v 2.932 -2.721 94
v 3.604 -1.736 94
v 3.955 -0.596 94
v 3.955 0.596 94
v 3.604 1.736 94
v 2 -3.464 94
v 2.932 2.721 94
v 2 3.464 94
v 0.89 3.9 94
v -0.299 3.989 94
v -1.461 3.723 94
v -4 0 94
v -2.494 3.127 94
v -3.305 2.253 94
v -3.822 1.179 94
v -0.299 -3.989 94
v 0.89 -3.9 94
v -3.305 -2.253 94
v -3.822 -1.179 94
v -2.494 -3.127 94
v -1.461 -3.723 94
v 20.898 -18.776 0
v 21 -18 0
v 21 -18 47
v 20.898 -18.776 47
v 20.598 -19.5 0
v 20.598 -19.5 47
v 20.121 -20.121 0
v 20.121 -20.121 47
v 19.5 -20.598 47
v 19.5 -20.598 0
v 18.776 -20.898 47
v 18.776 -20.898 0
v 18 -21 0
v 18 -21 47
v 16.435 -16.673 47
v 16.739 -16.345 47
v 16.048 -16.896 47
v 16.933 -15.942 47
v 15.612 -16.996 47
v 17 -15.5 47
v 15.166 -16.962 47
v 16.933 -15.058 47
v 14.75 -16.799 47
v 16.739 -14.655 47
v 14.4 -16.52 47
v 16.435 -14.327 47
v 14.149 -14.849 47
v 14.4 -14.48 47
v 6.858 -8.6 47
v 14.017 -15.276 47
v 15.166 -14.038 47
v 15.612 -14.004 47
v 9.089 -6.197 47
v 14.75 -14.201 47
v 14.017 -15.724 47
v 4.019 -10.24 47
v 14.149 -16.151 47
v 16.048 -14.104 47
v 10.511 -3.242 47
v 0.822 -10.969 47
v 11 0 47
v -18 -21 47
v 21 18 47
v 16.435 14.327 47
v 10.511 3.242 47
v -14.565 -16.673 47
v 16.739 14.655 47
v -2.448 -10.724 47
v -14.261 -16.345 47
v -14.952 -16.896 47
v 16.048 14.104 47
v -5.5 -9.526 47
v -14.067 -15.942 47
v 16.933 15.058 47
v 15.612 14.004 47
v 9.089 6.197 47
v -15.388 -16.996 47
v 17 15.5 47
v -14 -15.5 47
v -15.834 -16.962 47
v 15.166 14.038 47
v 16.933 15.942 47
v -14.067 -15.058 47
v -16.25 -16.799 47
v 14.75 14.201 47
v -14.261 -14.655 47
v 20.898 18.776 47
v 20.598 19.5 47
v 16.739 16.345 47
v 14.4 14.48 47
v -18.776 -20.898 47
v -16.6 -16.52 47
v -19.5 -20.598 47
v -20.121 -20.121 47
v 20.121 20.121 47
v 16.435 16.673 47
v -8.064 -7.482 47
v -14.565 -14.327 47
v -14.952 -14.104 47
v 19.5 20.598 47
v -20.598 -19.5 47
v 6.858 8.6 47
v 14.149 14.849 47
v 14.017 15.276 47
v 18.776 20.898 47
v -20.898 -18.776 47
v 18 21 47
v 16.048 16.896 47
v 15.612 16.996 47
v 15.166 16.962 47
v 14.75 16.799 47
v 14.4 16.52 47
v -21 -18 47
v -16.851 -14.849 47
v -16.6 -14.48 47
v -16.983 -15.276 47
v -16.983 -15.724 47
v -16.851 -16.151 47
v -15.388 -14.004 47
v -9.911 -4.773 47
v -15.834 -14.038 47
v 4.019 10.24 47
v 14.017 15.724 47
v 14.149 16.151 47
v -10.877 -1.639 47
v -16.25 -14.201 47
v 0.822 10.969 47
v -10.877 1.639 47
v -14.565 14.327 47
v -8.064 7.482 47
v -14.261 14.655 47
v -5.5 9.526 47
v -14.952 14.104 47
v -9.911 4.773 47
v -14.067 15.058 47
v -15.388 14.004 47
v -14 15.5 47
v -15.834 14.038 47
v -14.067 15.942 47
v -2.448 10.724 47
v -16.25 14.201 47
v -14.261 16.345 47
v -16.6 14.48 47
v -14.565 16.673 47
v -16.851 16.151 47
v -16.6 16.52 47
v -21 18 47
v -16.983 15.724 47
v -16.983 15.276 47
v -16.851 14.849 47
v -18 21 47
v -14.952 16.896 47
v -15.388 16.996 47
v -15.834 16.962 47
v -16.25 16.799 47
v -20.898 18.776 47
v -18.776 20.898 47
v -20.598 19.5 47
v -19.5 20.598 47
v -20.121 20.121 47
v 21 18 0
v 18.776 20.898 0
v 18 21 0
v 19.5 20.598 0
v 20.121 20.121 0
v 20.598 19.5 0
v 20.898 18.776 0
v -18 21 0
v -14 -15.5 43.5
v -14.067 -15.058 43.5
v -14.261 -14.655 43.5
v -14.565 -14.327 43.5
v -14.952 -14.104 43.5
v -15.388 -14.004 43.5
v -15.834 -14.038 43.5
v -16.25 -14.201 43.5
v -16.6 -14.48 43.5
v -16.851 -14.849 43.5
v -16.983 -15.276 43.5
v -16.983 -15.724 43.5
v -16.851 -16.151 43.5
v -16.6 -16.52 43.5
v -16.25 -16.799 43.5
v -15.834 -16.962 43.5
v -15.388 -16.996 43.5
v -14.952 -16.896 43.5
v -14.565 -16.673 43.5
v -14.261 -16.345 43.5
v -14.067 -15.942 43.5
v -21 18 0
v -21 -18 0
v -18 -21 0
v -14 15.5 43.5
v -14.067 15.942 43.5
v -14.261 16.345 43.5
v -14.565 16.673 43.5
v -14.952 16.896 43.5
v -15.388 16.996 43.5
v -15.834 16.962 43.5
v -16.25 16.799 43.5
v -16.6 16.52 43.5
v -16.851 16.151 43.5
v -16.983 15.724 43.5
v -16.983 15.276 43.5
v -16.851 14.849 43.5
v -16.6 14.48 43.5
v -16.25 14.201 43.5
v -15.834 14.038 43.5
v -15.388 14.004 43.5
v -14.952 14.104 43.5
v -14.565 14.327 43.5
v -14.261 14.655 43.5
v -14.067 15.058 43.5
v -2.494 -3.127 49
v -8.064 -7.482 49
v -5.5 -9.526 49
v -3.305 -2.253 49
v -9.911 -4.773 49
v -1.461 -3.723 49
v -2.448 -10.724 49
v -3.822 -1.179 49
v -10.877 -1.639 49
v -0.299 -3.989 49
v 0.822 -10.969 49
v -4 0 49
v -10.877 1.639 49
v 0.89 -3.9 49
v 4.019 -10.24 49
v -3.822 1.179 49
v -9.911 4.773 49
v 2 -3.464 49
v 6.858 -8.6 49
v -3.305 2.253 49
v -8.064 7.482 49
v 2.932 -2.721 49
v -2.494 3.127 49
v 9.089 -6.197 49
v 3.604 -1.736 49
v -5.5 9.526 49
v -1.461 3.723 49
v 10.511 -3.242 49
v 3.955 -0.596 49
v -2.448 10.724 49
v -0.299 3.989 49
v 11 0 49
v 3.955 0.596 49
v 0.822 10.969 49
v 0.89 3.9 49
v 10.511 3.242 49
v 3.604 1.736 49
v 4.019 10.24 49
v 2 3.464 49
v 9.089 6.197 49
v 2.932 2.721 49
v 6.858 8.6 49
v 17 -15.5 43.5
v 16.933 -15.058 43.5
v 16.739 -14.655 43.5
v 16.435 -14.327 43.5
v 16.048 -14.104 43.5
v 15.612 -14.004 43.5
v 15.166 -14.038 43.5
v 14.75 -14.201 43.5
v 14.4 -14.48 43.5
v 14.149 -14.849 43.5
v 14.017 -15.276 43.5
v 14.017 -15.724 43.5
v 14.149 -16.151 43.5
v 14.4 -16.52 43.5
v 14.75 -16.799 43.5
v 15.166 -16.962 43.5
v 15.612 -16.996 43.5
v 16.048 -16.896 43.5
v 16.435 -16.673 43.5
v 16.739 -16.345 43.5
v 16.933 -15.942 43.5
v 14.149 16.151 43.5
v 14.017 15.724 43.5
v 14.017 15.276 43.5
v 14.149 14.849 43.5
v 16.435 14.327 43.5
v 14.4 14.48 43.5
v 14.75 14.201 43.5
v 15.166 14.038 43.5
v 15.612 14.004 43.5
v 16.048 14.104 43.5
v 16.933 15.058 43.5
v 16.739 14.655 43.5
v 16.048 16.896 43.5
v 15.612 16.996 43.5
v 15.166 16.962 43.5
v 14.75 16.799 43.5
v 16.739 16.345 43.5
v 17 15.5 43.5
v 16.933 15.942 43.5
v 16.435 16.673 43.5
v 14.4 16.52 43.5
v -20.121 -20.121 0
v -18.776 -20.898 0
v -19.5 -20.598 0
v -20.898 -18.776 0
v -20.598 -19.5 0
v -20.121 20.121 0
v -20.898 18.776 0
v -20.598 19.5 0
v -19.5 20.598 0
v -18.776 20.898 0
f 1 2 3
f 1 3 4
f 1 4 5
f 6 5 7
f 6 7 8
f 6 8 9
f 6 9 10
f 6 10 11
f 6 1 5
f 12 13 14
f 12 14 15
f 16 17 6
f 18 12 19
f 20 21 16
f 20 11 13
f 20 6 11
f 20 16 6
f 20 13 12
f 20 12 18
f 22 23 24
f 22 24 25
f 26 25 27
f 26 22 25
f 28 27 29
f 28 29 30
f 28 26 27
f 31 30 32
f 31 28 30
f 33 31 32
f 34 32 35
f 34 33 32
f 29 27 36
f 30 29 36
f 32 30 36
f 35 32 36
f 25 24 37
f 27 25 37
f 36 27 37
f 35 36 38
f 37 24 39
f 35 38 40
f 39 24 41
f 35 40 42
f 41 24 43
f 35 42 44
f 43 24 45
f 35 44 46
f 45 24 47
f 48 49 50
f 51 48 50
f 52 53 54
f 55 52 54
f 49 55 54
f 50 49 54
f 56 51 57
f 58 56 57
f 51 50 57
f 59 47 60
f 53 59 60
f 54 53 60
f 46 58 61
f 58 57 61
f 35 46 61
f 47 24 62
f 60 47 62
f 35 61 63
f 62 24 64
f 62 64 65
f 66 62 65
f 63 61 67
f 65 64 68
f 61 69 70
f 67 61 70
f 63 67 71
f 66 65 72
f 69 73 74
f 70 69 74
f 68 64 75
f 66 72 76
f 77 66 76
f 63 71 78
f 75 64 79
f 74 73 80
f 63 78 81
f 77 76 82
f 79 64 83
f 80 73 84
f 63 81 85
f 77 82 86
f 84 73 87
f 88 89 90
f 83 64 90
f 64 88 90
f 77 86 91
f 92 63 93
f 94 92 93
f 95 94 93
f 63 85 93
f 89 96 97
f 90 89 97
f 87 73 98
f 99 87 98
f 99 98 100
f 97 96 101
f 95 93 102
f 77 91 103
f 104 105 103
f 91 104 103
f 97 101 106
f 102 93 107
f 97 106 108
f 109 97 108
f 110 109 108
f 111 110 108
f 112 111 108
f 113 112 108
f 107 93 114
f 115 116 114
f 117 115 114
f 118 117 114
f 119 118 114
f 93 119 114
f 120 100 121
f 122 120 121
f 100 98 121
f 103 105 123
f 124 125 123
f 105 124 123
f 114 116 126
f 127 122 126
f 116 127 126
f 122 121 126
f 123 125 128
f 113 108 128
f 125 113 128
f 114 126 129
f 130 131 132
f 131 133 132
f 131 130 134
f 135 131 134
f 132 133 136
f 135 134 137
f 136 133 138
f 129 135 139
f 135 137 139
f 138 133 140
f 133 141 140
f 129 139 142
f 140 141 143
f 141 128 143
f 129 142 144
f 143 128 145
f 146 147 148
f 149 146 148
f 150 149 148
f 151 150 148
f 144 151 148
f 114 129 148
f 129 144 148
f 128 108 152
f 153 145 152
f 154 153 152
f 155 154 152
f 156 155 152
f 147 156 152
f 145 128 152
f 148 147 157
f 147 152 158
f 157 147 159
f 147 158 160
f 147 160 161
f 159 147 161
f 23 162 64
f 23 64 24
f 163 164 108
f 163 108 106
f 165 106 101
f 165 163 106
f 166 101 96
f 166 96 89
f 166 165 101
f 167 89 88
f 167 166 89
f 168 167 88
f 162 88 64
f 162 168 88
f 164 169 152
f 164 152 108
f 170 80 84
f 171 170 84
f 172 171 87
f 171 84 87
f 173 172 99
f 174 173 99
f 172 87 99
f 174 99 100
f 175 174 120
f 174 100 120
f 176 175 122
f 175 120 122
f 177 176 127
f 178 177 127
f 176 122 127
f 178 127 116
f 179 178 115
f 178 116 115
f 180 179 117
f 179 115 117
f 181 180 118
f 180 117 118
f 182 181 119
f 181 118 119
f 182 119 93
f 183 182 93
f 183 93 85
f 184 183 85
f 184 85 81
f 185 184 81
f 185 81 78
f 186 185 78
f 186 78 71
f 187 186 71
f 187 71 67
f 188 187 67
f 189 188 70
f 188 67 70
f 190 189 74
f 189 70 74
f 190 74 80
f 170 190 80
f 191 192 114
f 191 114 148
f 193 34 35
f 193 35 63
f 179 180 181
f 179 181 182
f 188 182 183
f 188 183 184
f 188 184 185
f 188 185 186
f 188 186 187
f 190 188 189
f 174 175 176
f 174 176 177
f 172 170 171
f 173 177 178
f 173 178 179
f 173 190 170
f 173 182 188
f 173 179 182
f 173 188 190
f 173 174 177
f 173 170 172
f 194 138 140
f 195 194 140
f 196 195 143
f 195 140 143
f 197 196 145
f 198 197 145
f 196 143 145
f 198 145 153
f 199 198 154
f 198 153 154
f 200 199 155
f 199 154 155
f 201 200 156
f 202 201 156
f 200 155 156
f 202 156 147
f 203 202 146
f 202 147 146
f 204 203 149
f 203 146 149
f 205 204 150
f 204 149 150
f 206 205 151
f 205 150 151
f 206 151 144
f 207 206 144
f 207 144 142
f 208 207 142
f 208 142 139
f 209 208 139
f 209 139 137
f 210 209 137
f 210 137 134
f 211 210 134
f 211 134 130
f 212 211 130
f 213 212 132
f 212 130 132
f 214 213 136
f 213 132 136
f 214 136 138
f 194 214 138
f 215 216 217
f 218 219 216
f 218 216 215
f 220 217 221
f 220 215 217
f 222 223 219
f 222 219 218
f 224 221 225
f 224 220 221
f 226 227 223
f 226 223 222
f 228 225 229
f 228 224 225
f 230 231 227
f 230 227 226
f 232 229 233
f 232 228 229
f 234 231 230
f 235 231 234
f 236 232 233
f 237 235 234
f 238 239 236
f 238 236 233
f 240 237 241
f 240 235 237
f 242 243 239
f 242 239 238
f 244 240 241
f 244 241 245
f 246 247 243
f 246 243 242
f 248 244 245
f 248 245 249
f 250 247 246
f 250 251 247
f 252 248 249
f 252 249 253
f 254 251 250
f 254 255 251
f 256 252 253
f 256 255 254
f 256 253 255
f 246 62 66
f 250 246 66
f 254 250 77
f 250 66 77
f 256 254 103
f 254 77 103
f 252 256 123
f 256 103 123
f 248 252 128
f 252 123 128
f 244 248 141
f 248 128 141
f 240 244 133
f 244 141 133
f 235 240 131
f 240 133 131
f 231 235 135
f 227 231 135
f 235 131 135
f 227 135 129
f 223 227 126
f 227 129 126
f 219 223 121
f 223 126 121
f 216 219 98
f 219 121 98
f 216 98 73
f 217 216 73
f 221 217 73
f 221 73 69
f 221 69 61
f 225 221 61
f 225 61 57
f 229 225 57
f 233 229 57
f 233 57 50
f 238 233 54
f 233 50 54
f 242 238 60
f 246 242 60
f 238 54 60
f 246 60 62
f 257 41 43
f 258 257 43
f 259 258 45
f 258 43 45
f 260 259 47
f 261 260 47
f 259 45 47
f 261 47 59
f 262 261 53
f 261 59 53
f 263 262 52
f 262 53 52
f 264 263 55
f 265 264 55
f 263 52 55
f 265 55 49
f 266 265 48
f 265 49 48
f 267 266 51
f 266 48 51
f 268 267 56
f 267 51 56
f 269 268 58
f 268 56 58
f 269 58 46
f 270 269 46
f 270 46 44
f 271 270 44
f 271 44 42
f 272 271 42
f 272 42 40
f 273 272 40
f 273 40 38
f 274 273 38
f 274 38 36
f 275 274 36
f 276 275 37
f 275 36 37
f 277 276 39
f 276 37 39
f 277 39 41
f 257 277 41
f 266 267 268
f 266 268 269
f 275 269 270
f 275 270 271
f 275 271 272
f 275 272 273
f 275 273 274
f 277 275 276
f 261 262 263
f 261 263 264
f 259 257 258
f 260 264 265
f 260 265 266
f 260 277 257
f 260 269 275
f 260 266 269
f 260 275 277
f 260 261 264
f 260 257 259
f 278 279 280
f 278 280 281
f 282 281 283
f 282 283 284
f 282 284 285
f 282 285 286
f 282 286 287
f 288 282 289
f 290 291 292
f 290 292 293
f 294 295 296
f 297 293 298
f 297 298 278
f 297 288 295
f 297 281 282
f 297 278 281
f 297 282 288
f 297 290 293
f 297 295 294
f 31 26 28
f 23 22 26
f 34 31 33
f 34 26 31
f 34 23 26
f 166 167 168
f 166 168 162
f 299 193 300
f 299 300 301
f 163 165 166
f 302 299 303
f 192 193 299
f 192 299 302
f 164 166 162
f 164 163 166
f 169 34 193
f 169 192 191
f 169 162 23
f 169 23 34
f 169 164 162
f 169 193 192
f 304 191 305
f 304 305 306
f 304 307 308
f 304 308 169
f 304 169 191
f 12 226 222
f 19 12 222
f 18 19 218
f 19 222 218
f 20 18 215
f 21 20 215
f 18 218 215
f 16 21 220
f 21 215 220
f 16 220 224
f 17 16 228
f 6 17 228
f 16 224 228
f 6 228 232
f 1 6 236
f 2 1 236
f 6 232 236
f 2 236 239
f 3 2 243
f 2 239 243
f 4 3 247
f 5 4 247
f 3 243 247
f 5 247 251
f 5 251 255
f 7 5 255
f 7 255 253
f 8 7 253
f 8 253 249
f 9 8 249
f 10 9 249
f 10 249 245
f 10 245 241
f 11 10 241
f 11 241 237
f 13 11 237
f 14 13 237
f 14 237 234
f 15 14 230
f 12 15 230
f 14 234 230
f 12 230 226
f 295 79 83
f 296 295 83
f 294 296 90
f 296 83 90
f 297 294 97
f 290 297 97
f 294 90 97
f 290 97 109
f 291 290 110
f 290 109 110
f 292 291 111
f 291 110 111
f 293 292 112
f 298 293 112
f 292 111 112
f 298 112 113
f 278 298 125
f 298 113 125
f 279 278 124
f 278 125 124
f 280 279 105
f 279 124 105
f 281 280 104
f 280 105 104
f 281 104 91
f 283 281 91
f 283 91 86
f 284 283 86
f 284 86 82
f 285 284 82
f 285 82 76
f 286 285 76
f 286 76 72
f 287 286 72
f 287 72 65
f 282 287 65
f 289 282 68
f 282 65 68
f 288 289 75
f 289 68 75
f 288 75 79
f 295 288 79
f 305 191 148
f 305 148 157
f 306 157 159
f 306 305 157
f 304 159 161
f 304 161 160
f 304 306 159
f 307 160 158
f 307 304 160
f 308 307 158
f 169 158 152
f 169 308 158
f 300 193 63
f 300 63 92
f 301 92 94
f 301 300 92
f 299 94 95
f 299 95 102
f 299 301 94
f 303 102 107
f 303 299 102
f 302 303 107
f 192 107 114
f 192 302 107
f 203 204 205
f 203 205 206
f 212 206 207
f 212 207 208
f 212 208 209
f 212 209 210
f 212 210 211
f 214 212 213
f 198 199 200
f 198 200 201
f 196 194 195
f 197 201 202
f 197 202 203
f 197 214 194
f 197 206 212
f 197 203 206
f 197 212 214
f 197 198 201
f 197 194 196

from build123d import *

# Parameters (mm, degrees)
EXTRUDE_1_DEPTH     = 47
SKETCH_2_R          = 11
EXTRUDE_2_DEPTH     = 2
SKETCH_3_R          = 4
EXTRUDE_3_DEPTH     = 45
SKETCH_6_R          = 1.5
CUT_EXTRUDE_2_DEPTH = 3.5


with BuildPart() as part:
    # 草图1 → 凸台-拉伸1 (new body)
    with BuildSketch(Plane.XY):
        with BuildLine():
            Line((18, -21), (-18, -21))
            ThreePointArc((-18, -21), (-20.121320344, -20.121320344), (-21, -18))
            Line((-21, -18), (-21, 18))
            ThreePointArc((-21, 18), (-20.121320344, 20.121320344), (-18, 21))
            Line((-18, 21), (18, 21))
            ThreePointArc((18, 21), (20.121320344, 20.121320344), (21, 18))
            Line((21, 18), (21, -18))
            ThreePointArc((21, -18), (20.121320344, -20.121320344), (18, -21))
        make_face()
    extrude(amount=EXTRUDE_1_DEPTH)

    # 草图2 → 凸台-拉伸2 (add)
    with BuildSketch(Plane.XY.offset(47)):
        Circle(SKETCH_2_R)
    extrude(amount=EXTRUDE_2_DEPTH)

    # 草图3 → 凸台-拉伸3 (add)
    with BuildSketch(Plane.XY.offset(49)):
        with Locations(Location((0, 0, 0), (0, 0, 180))):
            Circle(SKETCH_3_R)
    extrude(amount=EXTRUDE_3_DEPTH)

    # 草图6 → 切除-拉伸2 (cut)
    with BuildSketch(Plane.XY.offset(47)):
        with Locations((-15.5, 15.5)):
            Circle(SKETCH_6_R)
        with Locations((15.5, 15.5)):
            Circle(SKETCH_6_R)
        with Locations((15.5, -15.5)):
            Circle(SKETCH_6_R)
        with Locations((-15.5, -15.5)):
            Circle(SKETCH_6_R)
    extrude(amount=-CUT_EXTRUDE_2_DEPTH, mode=Mode.SUBTRACT)


solid = part.part
